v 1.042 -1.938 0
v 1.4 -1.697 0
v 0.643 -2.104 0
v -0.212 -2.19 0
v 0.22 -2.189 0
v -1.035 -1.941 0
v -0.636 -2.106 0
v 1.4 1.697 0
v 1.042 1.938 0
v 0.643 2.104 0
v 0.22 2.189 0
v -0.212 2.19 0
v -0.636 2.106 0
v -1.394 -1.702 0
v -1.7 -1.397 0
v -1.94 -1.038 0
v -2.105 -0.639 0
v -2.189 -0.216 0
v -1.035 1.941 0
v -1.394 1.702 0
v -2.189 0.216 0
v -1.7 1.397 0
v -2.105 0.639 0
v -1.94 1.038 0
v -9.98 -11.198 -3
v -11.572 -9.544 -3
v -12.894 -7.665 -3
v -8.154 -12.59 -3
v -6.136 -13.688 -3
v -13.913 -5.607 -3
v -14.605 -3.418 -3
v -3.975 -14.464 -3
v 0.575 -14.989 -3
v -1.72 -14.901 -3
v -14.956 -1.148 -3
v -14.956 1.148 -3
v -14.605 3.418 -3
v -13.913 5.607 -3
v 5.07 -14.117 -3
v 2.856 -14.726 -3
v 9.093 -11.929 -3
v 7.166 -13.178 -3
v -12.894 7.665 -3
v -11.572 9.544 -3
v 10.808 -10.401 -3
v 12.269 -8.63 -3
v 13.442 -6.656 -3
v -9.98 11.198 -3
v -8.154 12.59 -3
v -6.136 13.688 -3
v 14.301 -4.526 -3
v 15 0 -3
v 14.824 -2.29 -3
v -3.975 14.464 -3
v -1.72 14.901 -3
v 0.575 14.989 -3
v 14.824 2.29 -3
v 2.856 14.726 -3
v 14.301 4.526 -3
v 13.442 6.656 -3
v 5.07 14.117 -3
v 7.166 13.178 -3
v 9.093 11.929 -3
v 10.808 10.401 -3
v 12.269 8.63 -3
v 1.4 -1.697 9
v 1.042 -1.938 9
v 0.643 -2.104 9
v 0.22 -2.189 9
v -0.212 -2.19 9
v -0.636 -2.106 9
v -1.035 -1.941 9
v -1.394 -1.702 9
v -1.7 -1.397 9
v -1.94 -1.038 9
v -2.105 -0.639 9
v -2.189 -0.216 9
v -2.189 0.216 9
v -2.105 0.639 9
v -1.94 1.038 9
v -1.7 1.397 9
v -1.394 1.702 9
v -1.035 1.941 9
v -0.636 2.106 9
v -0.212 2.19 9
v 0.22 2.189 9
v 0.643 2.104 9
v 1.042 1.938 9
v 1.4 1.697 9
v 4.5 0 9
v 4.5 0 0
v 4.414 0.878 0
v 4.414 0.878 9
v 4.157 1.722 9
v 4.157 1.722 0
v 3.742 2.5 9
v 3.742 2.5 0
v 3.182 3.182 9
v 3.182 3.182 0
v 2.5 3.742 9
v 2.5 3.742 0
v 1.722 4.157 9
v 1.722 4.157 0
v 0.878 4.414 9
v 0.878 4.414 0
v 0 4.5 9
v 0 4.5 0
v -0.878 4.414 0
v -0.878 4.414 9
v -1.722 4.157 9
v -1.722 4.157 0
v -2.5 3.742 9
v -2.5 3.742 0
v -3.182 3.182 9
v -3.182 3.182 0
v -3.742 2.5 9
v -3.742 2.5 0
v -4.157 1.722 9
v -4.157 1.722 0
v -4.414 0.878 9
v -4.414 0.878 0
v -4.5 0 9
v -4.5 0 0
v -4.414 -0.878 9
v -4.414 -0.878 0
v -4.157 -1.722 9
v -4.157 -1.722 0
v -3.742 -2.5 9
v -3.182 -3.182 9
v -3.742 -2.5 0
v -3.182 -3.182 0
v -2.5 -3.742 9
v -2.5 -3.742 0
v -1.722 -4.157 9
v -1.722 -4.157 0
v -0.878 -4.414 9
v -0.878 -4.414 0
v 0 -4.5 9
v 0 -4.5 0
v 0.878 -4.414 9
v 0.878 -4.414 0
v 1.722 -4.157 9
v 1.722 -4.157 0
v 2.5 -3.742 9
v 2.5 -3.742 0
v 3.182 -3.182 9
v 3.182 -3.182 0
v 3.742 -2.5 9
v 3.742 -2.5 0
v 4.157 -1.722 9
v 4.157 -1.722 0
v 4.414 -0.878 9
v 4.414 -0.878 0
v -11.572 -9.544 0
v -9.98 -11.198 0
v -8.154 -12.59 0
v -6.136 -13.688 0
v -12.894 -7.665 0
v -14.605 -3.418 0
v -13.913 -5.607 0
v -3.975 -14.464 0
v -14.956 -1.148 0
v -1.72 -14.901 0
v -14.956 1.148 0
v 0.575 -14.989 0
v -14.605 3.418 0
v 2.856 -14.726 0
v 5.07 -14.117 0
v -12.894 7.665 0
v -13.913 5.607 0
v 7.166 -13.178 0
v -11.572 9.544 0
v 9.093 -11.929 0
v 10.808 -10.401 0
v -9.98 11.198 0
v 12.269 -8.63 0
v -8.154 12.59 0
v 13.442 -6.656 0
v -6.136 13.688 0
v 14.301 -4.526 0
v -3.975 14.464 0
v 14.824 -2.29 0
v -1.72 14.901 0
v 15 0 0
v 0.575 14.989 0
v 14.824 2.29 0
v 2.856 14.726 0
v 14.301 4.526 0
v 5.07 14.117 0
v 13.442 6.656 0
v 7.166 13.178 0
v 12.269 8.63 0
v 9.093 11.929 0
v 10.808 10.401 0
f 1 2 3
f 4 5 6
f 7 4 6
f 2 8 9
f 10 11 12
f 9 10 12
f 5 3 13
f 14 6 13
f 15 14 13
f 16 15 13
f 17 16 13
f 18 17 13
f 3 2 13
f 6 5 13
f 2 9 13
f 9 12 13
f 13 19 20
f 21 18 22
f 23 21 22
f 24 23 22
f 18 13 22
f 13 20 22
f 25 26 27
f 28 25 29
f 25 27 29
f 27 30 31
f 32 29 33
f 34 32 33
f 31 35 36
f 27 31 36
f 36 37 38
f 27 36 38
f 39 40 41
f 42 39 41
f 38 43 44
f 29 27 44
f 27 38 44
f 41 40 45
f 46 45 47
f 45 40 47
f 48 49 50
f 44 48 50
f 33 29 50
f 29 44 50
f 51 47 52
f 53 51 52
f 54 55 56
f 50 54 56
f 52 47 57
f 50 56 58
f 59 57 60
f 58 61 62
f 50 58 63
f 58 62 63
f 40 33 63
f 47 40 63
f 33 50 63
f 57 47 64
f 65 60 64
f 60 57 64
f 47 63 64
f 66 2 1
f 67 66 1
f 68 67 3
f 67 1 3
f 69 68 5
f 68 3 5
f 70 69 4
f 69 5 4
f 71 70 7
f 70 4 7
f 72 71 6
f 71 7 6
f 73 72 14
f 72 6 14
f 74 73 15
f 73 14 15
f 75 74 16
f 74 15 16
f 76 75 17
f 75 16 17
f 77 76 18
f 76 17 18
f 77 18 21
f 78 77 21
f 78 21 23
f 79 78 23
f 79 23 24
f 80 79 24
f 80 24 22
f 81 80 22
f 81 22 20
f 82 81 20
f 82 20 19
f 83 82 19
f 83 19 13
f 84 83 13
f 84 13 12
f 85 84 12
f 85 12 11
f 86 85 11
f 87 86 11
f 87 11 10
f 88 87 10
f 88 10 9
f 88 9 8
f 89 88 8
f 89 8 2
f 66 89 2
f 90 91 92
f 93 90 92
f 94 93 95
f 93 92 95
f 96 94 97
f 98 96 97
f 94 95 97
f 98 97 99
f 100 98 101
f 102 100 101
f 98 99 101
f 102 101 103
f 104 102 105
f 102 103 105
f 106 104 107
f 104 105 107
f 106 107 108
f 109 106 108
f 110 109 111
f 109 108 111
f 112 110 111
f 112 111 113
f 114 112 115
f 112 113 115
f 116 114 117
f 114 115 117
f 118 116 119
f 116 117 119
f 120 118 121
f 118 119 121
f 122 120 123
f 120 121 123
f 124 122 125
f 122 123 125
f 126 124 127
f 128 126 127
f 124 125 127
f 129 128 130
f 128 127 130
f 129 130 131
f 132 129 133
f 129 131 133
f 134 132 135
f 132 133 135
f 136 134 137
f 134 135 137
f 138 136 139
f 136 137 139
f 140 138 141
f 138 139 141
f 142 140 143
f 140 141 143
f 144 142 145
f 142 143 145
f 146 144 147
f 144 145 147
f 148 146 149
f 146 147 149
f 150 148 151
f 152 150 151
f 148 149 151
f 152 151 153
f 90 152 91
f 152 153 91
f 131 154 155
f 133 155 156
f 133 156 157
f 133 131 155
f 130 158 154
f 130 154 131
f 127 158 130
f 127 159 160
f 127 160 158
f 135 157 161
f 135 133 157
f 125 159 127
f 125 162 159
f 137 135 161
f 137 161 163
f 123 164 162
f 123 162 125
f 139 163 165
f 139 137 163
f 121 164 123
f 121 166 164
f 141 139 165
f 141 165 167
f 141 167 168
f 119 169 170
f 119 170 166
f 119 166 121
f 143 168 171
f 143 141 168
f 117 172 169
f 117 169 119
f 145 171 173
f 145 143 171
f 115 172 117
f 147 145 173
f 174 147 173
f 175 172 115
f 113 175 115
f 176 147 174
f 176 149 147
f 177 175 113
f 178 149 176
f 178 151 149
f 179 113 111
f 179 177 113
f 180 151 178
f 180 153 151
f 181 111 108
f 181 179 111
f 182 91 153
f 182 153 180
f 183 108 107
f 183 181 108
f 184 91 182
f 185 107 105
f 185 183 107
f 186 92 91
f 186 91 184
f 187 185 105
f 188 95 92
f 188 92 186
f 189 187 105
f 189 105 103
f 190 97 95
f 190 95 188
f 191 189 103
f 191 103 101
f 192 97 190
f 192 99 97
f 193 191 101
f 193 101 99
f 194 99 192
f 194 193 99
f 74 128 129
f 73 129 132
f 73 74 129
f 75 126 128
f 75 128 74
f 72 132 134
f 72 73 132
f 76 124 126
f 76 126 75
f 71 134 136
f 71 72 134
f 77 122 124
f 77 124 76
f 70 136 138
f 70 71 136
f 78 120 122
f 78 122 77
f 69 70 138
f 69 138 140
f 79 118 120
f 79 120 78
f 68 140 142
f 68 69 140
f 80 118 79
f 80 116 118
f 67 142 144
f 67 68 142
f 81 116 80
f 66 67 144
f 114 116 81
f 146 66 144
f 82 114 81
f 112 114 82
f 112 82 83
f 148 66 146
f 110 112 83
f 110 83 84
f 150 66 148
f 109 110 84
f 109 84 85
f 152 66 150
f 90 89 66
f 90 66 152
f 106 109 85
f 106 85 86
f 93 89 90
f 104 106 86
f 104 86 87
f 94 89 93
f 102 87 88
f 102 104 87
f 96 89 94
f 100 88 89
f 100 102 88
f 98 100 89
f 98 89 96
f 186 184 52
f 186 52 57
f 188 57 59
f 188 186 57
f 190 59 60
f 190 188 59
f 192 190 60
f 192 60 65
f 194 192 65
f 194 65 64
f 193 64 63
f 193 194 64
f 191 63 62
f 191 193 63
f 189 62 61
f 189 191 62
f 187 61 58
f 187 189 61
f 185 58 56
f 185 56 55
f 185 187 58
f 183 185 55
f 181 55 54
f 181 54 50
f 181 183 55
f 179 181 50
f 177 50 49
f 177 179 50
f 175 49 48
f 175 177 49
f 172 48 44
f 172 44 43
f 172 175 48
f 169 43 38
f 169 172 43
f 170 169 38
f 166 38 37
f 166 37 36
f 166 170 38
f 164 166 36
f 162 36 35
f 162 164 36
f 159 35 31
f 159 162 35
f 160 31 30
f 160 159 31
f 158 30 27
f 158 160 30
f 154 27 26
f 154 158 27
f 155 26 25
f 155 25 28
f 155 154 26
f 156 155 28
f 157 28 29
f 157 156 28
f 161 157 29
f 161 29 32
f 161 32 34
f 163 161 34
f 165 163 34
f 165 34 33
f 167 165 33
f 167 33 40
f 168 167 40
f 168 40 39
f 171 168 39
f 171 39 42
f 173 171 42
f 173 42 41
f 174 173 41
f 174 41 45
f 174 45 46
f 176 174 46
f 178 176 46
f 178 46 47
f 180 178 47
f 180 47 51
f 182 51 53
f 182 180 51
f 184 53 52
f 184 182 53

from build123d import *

# Parameters (mm, degrees)
SKETCH_2_R          = 4.5
EXTRUDE_1_DEPTH     = 9
SKETCH_3_R          = 15
EXTRUDE_2_DEPTH     = 3
CUT_EXTRUDE_1_DEPTH = 10


with BuildPart() as part:
    # Эскиз2 → Бобышка-Вытянуть1 (new body)
    with BuildSketch(Plane.XY):
        Circle(SKETCH_2_R)
    extrude(amount=EXTRUDE_1_DEPTH)

    # Эскиз3 → Бобышка-Вытянуть2 (add)
    with BuildSketch(Plane.XY):
        Circle(SKETCH_3_R)
    extrude(amount=-EXTRUDE_2_DEPTH)

    # Эскиз1 → Вырез-Вытянуть1 (cut)
    with BuildSketch(Plane.XY):
        with BuildLine():
            Line((1.4, 1.697056275), (1.4, -1.697056275))
            ThreePointArc((1.4, -1.697056275), (-2.2, 0), (1.4, 1.697056275))
        make_face()
    extrude(amount=CUT_EXTRUDE_1_DEPTH, mode=Mode.SUBTRACT)


solid = part.part
